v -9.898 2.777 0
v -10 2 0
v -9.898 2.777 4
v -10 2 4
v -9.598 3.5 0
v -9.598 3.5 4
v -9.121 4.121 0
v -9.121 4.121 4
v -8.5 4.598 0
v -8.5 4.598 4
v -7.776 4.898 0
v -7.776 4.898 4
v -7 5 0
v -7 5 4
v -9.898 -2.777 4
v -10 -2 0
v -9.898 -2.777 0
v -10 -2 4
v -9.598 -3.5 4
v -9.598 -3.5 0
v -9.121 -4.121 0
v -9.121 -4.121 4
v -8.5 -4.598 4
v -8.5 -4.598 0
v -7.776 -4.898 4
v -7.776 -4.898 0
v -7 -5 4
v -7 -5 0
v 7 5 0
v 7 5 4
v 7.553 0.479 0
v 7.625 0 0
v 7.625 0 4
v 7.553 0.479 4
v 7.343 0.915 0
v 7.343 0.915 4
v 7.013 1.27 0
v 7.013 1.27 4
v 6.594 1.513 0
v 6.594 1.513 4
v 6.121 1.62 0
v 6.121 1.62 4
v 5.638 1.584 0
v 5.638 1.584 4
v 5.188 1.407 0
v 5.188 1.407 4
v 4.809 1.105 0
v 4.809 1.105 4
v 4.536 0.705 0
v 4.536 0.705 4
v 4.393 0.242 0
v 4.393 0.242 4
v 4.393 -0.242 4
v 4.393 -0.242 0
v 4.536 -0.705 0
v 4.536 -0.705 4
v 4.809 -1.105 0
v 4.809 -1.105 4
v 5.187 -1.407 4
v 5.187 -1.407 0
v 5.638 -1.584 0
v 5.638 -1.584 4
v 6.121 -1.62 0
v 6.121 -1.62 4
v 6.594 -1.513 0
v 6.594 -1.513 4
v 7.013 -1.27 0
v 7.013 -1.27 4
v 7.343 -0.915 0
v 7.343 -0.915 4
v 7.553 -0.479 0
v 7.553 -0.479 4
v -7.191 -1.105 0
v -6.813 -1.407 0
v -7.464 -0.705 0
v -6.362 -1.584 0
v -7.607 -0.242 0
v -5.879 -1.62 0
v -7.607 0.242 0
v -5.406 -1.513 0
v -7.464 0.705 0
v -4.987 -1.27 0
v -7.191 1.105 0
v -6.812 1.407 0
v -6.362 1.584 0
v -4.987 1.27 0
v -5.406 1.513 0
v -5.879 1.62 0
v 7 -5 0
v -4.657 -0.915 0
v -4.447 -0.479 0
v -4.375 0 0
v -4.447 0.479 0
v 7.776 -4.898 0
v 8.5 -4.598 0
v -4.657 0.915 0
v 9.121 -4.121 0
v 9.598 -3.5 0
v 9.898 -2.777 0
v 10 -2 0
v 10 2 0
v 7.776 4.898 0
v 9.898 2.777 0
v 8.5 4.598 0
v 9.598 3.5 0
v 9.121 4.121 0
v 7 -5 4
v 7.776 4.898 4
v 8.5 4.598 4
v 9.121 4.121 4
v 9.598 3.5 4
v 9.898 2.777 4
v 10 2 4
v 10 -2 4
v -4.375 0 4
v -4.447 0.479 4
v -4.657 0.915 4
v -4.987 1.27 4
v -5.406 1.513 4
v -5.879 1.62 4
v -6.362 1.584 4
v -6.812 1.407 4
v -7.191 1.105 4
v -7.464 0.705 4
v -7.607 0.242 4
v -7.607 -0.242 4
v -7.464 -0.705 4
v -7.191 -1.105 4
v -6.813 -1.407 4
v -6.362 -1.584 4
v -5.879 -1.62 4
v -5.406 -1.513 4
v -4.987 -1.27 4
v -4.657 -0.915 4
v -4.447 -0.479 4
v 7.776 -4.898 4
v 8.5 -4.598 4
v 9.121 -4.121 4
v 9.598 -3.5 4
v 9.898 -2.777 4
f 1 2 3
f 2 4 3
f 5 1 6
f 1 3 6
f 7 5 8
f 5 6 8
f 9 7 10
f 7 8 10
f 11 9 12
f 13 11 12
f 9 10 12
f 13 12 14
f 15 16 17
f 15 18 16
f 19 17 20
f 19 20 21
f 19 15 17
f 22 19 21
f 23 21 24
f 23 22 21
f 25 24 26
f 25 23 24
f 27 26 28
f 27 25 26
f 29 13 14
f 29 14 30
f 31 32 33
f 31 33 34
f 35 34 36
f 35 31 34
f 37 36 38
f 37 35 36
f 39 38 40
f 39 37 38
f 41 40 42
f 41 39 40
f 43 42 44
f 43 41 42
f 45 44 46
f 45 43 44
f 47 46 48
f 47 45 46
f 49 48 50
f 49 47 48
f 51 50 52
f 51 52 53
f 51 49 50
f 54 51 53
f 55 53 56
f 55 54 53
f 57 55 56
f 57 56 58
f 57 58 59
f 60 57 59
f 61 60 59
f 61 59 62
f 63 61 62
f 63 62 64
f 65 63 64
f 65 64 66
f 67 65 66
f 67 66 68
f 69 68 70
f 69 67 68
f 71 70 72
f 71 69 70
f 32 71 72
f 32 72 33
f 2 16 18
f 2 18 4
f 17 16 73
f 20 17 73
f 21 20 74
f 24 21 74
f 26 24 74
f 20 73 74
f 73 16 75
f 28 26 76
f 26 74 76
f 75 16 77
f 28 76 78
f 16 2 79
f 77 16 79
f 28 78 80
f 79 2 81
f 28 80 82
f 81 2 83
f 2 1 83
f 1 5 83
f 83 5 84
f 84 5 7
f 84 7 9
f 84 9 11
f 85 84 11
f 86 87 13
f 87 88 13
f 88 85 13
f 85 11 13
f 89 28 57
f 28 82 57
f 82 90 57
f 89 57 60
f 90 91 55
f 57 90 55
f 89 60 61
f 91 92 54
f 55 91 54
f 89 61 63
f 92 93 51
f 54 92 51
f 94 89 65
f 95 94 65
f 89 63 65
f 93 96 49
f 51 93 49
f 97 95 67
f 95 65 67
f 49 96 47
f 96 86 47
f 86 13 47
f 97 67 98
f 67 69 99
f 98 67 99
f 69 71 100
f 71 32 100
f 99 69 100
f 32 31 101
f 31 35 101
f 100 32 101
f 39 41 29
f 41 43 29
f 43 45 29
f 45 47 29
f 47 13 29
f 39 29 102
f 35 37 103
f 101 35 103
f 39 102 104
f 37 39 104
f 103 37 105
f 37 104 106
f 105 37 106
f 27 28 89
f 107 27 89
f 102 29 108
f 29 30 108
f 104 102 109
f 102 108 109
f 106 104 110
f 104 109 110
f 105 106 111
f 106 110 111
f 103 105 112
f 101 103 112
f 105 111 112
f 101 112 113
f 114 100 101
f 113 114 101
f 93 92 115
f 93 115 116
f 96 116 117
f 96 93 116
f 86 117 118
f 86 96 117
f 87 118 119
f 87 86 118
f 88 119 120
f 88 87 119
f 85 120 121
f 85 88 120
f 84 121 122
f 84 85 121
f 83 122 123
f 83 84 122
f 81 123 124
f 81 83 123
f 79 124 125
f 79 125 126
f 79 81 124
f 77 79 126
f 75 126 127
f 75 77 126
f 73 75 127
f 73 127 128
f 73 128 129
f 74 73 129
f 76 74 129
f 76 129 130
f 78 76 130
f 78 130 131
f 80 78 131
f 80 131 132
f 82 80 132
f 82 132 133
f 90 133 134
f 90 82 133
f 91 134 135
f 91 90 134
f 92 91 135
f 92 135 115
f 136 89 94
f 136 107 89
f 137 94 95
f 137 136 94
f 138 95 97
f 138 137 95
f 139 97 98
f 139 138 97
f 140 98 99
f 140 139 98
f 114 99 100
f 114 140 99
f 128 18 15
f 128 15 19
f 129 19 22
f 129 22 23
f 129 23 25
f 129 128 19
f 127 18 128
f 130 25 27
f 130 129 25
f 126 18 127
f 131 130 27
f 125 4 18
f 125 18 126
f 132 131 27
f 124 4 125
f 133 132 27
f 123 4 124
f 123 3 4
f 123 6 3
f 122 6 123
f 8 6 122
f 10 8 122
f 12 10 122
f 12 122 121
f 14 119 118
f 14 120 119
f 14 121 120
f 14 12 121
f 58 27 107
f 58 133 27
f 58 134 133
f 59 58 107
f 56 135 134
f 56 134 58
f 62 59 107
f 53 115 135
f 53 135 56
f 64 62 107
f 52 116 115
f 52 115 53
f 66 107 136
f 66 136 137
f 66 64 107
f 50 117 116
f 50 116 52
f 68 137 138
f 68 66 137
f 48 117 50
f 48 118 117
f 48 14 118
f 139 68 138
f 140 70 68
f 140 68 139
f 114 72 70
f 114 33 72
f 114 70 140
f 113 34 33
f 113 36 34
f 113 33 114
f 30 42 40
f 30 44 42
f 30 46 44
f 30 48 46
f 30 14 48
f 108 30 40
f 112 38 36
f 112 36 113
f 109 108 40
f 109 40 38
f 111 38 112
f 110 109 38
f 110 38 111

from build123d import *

# Parameters (mm, degrees)
CROQUIS1_W              = 20
CROQUIS1_H              = 10.000326638
CROQUIS1_R              = 1.625
SALIENTE_EXTRUIR1_DEPTH = 4
REDONDEO1_R             = 3


with BuildPart() as part:
    # Croquis1 → Saliente-Extruir1 (new body)
    with BuildSketch(Plane.XY):
        Rectangle(CROQUIS1_W, CROQUIS1_H)
        with Locations((-6, 0)):
            Circle(CROQUIS1_R, mode=Mode.SUBTRACT)
        with Locations((6, 0)):
            Circle(CROQUIS1_R, mode=Mode.SUBTRACT)
    extrude(amount=SALIENTE_EXTRUIR1_DEPTH)

    # Redondeo1
    redondeo1_edges = [part.edges().sort_by_distance(p)[0] for p in [
        (10, -5.000163319, 2),
        (-10, -5.000163319, 2),
        (-10, 5.000163319, 2),
        (10, 5.000163319, 2),
    ]]
    fillet(redondeo1_edges, radius=REDONDEO1_R)


solid = part.part
